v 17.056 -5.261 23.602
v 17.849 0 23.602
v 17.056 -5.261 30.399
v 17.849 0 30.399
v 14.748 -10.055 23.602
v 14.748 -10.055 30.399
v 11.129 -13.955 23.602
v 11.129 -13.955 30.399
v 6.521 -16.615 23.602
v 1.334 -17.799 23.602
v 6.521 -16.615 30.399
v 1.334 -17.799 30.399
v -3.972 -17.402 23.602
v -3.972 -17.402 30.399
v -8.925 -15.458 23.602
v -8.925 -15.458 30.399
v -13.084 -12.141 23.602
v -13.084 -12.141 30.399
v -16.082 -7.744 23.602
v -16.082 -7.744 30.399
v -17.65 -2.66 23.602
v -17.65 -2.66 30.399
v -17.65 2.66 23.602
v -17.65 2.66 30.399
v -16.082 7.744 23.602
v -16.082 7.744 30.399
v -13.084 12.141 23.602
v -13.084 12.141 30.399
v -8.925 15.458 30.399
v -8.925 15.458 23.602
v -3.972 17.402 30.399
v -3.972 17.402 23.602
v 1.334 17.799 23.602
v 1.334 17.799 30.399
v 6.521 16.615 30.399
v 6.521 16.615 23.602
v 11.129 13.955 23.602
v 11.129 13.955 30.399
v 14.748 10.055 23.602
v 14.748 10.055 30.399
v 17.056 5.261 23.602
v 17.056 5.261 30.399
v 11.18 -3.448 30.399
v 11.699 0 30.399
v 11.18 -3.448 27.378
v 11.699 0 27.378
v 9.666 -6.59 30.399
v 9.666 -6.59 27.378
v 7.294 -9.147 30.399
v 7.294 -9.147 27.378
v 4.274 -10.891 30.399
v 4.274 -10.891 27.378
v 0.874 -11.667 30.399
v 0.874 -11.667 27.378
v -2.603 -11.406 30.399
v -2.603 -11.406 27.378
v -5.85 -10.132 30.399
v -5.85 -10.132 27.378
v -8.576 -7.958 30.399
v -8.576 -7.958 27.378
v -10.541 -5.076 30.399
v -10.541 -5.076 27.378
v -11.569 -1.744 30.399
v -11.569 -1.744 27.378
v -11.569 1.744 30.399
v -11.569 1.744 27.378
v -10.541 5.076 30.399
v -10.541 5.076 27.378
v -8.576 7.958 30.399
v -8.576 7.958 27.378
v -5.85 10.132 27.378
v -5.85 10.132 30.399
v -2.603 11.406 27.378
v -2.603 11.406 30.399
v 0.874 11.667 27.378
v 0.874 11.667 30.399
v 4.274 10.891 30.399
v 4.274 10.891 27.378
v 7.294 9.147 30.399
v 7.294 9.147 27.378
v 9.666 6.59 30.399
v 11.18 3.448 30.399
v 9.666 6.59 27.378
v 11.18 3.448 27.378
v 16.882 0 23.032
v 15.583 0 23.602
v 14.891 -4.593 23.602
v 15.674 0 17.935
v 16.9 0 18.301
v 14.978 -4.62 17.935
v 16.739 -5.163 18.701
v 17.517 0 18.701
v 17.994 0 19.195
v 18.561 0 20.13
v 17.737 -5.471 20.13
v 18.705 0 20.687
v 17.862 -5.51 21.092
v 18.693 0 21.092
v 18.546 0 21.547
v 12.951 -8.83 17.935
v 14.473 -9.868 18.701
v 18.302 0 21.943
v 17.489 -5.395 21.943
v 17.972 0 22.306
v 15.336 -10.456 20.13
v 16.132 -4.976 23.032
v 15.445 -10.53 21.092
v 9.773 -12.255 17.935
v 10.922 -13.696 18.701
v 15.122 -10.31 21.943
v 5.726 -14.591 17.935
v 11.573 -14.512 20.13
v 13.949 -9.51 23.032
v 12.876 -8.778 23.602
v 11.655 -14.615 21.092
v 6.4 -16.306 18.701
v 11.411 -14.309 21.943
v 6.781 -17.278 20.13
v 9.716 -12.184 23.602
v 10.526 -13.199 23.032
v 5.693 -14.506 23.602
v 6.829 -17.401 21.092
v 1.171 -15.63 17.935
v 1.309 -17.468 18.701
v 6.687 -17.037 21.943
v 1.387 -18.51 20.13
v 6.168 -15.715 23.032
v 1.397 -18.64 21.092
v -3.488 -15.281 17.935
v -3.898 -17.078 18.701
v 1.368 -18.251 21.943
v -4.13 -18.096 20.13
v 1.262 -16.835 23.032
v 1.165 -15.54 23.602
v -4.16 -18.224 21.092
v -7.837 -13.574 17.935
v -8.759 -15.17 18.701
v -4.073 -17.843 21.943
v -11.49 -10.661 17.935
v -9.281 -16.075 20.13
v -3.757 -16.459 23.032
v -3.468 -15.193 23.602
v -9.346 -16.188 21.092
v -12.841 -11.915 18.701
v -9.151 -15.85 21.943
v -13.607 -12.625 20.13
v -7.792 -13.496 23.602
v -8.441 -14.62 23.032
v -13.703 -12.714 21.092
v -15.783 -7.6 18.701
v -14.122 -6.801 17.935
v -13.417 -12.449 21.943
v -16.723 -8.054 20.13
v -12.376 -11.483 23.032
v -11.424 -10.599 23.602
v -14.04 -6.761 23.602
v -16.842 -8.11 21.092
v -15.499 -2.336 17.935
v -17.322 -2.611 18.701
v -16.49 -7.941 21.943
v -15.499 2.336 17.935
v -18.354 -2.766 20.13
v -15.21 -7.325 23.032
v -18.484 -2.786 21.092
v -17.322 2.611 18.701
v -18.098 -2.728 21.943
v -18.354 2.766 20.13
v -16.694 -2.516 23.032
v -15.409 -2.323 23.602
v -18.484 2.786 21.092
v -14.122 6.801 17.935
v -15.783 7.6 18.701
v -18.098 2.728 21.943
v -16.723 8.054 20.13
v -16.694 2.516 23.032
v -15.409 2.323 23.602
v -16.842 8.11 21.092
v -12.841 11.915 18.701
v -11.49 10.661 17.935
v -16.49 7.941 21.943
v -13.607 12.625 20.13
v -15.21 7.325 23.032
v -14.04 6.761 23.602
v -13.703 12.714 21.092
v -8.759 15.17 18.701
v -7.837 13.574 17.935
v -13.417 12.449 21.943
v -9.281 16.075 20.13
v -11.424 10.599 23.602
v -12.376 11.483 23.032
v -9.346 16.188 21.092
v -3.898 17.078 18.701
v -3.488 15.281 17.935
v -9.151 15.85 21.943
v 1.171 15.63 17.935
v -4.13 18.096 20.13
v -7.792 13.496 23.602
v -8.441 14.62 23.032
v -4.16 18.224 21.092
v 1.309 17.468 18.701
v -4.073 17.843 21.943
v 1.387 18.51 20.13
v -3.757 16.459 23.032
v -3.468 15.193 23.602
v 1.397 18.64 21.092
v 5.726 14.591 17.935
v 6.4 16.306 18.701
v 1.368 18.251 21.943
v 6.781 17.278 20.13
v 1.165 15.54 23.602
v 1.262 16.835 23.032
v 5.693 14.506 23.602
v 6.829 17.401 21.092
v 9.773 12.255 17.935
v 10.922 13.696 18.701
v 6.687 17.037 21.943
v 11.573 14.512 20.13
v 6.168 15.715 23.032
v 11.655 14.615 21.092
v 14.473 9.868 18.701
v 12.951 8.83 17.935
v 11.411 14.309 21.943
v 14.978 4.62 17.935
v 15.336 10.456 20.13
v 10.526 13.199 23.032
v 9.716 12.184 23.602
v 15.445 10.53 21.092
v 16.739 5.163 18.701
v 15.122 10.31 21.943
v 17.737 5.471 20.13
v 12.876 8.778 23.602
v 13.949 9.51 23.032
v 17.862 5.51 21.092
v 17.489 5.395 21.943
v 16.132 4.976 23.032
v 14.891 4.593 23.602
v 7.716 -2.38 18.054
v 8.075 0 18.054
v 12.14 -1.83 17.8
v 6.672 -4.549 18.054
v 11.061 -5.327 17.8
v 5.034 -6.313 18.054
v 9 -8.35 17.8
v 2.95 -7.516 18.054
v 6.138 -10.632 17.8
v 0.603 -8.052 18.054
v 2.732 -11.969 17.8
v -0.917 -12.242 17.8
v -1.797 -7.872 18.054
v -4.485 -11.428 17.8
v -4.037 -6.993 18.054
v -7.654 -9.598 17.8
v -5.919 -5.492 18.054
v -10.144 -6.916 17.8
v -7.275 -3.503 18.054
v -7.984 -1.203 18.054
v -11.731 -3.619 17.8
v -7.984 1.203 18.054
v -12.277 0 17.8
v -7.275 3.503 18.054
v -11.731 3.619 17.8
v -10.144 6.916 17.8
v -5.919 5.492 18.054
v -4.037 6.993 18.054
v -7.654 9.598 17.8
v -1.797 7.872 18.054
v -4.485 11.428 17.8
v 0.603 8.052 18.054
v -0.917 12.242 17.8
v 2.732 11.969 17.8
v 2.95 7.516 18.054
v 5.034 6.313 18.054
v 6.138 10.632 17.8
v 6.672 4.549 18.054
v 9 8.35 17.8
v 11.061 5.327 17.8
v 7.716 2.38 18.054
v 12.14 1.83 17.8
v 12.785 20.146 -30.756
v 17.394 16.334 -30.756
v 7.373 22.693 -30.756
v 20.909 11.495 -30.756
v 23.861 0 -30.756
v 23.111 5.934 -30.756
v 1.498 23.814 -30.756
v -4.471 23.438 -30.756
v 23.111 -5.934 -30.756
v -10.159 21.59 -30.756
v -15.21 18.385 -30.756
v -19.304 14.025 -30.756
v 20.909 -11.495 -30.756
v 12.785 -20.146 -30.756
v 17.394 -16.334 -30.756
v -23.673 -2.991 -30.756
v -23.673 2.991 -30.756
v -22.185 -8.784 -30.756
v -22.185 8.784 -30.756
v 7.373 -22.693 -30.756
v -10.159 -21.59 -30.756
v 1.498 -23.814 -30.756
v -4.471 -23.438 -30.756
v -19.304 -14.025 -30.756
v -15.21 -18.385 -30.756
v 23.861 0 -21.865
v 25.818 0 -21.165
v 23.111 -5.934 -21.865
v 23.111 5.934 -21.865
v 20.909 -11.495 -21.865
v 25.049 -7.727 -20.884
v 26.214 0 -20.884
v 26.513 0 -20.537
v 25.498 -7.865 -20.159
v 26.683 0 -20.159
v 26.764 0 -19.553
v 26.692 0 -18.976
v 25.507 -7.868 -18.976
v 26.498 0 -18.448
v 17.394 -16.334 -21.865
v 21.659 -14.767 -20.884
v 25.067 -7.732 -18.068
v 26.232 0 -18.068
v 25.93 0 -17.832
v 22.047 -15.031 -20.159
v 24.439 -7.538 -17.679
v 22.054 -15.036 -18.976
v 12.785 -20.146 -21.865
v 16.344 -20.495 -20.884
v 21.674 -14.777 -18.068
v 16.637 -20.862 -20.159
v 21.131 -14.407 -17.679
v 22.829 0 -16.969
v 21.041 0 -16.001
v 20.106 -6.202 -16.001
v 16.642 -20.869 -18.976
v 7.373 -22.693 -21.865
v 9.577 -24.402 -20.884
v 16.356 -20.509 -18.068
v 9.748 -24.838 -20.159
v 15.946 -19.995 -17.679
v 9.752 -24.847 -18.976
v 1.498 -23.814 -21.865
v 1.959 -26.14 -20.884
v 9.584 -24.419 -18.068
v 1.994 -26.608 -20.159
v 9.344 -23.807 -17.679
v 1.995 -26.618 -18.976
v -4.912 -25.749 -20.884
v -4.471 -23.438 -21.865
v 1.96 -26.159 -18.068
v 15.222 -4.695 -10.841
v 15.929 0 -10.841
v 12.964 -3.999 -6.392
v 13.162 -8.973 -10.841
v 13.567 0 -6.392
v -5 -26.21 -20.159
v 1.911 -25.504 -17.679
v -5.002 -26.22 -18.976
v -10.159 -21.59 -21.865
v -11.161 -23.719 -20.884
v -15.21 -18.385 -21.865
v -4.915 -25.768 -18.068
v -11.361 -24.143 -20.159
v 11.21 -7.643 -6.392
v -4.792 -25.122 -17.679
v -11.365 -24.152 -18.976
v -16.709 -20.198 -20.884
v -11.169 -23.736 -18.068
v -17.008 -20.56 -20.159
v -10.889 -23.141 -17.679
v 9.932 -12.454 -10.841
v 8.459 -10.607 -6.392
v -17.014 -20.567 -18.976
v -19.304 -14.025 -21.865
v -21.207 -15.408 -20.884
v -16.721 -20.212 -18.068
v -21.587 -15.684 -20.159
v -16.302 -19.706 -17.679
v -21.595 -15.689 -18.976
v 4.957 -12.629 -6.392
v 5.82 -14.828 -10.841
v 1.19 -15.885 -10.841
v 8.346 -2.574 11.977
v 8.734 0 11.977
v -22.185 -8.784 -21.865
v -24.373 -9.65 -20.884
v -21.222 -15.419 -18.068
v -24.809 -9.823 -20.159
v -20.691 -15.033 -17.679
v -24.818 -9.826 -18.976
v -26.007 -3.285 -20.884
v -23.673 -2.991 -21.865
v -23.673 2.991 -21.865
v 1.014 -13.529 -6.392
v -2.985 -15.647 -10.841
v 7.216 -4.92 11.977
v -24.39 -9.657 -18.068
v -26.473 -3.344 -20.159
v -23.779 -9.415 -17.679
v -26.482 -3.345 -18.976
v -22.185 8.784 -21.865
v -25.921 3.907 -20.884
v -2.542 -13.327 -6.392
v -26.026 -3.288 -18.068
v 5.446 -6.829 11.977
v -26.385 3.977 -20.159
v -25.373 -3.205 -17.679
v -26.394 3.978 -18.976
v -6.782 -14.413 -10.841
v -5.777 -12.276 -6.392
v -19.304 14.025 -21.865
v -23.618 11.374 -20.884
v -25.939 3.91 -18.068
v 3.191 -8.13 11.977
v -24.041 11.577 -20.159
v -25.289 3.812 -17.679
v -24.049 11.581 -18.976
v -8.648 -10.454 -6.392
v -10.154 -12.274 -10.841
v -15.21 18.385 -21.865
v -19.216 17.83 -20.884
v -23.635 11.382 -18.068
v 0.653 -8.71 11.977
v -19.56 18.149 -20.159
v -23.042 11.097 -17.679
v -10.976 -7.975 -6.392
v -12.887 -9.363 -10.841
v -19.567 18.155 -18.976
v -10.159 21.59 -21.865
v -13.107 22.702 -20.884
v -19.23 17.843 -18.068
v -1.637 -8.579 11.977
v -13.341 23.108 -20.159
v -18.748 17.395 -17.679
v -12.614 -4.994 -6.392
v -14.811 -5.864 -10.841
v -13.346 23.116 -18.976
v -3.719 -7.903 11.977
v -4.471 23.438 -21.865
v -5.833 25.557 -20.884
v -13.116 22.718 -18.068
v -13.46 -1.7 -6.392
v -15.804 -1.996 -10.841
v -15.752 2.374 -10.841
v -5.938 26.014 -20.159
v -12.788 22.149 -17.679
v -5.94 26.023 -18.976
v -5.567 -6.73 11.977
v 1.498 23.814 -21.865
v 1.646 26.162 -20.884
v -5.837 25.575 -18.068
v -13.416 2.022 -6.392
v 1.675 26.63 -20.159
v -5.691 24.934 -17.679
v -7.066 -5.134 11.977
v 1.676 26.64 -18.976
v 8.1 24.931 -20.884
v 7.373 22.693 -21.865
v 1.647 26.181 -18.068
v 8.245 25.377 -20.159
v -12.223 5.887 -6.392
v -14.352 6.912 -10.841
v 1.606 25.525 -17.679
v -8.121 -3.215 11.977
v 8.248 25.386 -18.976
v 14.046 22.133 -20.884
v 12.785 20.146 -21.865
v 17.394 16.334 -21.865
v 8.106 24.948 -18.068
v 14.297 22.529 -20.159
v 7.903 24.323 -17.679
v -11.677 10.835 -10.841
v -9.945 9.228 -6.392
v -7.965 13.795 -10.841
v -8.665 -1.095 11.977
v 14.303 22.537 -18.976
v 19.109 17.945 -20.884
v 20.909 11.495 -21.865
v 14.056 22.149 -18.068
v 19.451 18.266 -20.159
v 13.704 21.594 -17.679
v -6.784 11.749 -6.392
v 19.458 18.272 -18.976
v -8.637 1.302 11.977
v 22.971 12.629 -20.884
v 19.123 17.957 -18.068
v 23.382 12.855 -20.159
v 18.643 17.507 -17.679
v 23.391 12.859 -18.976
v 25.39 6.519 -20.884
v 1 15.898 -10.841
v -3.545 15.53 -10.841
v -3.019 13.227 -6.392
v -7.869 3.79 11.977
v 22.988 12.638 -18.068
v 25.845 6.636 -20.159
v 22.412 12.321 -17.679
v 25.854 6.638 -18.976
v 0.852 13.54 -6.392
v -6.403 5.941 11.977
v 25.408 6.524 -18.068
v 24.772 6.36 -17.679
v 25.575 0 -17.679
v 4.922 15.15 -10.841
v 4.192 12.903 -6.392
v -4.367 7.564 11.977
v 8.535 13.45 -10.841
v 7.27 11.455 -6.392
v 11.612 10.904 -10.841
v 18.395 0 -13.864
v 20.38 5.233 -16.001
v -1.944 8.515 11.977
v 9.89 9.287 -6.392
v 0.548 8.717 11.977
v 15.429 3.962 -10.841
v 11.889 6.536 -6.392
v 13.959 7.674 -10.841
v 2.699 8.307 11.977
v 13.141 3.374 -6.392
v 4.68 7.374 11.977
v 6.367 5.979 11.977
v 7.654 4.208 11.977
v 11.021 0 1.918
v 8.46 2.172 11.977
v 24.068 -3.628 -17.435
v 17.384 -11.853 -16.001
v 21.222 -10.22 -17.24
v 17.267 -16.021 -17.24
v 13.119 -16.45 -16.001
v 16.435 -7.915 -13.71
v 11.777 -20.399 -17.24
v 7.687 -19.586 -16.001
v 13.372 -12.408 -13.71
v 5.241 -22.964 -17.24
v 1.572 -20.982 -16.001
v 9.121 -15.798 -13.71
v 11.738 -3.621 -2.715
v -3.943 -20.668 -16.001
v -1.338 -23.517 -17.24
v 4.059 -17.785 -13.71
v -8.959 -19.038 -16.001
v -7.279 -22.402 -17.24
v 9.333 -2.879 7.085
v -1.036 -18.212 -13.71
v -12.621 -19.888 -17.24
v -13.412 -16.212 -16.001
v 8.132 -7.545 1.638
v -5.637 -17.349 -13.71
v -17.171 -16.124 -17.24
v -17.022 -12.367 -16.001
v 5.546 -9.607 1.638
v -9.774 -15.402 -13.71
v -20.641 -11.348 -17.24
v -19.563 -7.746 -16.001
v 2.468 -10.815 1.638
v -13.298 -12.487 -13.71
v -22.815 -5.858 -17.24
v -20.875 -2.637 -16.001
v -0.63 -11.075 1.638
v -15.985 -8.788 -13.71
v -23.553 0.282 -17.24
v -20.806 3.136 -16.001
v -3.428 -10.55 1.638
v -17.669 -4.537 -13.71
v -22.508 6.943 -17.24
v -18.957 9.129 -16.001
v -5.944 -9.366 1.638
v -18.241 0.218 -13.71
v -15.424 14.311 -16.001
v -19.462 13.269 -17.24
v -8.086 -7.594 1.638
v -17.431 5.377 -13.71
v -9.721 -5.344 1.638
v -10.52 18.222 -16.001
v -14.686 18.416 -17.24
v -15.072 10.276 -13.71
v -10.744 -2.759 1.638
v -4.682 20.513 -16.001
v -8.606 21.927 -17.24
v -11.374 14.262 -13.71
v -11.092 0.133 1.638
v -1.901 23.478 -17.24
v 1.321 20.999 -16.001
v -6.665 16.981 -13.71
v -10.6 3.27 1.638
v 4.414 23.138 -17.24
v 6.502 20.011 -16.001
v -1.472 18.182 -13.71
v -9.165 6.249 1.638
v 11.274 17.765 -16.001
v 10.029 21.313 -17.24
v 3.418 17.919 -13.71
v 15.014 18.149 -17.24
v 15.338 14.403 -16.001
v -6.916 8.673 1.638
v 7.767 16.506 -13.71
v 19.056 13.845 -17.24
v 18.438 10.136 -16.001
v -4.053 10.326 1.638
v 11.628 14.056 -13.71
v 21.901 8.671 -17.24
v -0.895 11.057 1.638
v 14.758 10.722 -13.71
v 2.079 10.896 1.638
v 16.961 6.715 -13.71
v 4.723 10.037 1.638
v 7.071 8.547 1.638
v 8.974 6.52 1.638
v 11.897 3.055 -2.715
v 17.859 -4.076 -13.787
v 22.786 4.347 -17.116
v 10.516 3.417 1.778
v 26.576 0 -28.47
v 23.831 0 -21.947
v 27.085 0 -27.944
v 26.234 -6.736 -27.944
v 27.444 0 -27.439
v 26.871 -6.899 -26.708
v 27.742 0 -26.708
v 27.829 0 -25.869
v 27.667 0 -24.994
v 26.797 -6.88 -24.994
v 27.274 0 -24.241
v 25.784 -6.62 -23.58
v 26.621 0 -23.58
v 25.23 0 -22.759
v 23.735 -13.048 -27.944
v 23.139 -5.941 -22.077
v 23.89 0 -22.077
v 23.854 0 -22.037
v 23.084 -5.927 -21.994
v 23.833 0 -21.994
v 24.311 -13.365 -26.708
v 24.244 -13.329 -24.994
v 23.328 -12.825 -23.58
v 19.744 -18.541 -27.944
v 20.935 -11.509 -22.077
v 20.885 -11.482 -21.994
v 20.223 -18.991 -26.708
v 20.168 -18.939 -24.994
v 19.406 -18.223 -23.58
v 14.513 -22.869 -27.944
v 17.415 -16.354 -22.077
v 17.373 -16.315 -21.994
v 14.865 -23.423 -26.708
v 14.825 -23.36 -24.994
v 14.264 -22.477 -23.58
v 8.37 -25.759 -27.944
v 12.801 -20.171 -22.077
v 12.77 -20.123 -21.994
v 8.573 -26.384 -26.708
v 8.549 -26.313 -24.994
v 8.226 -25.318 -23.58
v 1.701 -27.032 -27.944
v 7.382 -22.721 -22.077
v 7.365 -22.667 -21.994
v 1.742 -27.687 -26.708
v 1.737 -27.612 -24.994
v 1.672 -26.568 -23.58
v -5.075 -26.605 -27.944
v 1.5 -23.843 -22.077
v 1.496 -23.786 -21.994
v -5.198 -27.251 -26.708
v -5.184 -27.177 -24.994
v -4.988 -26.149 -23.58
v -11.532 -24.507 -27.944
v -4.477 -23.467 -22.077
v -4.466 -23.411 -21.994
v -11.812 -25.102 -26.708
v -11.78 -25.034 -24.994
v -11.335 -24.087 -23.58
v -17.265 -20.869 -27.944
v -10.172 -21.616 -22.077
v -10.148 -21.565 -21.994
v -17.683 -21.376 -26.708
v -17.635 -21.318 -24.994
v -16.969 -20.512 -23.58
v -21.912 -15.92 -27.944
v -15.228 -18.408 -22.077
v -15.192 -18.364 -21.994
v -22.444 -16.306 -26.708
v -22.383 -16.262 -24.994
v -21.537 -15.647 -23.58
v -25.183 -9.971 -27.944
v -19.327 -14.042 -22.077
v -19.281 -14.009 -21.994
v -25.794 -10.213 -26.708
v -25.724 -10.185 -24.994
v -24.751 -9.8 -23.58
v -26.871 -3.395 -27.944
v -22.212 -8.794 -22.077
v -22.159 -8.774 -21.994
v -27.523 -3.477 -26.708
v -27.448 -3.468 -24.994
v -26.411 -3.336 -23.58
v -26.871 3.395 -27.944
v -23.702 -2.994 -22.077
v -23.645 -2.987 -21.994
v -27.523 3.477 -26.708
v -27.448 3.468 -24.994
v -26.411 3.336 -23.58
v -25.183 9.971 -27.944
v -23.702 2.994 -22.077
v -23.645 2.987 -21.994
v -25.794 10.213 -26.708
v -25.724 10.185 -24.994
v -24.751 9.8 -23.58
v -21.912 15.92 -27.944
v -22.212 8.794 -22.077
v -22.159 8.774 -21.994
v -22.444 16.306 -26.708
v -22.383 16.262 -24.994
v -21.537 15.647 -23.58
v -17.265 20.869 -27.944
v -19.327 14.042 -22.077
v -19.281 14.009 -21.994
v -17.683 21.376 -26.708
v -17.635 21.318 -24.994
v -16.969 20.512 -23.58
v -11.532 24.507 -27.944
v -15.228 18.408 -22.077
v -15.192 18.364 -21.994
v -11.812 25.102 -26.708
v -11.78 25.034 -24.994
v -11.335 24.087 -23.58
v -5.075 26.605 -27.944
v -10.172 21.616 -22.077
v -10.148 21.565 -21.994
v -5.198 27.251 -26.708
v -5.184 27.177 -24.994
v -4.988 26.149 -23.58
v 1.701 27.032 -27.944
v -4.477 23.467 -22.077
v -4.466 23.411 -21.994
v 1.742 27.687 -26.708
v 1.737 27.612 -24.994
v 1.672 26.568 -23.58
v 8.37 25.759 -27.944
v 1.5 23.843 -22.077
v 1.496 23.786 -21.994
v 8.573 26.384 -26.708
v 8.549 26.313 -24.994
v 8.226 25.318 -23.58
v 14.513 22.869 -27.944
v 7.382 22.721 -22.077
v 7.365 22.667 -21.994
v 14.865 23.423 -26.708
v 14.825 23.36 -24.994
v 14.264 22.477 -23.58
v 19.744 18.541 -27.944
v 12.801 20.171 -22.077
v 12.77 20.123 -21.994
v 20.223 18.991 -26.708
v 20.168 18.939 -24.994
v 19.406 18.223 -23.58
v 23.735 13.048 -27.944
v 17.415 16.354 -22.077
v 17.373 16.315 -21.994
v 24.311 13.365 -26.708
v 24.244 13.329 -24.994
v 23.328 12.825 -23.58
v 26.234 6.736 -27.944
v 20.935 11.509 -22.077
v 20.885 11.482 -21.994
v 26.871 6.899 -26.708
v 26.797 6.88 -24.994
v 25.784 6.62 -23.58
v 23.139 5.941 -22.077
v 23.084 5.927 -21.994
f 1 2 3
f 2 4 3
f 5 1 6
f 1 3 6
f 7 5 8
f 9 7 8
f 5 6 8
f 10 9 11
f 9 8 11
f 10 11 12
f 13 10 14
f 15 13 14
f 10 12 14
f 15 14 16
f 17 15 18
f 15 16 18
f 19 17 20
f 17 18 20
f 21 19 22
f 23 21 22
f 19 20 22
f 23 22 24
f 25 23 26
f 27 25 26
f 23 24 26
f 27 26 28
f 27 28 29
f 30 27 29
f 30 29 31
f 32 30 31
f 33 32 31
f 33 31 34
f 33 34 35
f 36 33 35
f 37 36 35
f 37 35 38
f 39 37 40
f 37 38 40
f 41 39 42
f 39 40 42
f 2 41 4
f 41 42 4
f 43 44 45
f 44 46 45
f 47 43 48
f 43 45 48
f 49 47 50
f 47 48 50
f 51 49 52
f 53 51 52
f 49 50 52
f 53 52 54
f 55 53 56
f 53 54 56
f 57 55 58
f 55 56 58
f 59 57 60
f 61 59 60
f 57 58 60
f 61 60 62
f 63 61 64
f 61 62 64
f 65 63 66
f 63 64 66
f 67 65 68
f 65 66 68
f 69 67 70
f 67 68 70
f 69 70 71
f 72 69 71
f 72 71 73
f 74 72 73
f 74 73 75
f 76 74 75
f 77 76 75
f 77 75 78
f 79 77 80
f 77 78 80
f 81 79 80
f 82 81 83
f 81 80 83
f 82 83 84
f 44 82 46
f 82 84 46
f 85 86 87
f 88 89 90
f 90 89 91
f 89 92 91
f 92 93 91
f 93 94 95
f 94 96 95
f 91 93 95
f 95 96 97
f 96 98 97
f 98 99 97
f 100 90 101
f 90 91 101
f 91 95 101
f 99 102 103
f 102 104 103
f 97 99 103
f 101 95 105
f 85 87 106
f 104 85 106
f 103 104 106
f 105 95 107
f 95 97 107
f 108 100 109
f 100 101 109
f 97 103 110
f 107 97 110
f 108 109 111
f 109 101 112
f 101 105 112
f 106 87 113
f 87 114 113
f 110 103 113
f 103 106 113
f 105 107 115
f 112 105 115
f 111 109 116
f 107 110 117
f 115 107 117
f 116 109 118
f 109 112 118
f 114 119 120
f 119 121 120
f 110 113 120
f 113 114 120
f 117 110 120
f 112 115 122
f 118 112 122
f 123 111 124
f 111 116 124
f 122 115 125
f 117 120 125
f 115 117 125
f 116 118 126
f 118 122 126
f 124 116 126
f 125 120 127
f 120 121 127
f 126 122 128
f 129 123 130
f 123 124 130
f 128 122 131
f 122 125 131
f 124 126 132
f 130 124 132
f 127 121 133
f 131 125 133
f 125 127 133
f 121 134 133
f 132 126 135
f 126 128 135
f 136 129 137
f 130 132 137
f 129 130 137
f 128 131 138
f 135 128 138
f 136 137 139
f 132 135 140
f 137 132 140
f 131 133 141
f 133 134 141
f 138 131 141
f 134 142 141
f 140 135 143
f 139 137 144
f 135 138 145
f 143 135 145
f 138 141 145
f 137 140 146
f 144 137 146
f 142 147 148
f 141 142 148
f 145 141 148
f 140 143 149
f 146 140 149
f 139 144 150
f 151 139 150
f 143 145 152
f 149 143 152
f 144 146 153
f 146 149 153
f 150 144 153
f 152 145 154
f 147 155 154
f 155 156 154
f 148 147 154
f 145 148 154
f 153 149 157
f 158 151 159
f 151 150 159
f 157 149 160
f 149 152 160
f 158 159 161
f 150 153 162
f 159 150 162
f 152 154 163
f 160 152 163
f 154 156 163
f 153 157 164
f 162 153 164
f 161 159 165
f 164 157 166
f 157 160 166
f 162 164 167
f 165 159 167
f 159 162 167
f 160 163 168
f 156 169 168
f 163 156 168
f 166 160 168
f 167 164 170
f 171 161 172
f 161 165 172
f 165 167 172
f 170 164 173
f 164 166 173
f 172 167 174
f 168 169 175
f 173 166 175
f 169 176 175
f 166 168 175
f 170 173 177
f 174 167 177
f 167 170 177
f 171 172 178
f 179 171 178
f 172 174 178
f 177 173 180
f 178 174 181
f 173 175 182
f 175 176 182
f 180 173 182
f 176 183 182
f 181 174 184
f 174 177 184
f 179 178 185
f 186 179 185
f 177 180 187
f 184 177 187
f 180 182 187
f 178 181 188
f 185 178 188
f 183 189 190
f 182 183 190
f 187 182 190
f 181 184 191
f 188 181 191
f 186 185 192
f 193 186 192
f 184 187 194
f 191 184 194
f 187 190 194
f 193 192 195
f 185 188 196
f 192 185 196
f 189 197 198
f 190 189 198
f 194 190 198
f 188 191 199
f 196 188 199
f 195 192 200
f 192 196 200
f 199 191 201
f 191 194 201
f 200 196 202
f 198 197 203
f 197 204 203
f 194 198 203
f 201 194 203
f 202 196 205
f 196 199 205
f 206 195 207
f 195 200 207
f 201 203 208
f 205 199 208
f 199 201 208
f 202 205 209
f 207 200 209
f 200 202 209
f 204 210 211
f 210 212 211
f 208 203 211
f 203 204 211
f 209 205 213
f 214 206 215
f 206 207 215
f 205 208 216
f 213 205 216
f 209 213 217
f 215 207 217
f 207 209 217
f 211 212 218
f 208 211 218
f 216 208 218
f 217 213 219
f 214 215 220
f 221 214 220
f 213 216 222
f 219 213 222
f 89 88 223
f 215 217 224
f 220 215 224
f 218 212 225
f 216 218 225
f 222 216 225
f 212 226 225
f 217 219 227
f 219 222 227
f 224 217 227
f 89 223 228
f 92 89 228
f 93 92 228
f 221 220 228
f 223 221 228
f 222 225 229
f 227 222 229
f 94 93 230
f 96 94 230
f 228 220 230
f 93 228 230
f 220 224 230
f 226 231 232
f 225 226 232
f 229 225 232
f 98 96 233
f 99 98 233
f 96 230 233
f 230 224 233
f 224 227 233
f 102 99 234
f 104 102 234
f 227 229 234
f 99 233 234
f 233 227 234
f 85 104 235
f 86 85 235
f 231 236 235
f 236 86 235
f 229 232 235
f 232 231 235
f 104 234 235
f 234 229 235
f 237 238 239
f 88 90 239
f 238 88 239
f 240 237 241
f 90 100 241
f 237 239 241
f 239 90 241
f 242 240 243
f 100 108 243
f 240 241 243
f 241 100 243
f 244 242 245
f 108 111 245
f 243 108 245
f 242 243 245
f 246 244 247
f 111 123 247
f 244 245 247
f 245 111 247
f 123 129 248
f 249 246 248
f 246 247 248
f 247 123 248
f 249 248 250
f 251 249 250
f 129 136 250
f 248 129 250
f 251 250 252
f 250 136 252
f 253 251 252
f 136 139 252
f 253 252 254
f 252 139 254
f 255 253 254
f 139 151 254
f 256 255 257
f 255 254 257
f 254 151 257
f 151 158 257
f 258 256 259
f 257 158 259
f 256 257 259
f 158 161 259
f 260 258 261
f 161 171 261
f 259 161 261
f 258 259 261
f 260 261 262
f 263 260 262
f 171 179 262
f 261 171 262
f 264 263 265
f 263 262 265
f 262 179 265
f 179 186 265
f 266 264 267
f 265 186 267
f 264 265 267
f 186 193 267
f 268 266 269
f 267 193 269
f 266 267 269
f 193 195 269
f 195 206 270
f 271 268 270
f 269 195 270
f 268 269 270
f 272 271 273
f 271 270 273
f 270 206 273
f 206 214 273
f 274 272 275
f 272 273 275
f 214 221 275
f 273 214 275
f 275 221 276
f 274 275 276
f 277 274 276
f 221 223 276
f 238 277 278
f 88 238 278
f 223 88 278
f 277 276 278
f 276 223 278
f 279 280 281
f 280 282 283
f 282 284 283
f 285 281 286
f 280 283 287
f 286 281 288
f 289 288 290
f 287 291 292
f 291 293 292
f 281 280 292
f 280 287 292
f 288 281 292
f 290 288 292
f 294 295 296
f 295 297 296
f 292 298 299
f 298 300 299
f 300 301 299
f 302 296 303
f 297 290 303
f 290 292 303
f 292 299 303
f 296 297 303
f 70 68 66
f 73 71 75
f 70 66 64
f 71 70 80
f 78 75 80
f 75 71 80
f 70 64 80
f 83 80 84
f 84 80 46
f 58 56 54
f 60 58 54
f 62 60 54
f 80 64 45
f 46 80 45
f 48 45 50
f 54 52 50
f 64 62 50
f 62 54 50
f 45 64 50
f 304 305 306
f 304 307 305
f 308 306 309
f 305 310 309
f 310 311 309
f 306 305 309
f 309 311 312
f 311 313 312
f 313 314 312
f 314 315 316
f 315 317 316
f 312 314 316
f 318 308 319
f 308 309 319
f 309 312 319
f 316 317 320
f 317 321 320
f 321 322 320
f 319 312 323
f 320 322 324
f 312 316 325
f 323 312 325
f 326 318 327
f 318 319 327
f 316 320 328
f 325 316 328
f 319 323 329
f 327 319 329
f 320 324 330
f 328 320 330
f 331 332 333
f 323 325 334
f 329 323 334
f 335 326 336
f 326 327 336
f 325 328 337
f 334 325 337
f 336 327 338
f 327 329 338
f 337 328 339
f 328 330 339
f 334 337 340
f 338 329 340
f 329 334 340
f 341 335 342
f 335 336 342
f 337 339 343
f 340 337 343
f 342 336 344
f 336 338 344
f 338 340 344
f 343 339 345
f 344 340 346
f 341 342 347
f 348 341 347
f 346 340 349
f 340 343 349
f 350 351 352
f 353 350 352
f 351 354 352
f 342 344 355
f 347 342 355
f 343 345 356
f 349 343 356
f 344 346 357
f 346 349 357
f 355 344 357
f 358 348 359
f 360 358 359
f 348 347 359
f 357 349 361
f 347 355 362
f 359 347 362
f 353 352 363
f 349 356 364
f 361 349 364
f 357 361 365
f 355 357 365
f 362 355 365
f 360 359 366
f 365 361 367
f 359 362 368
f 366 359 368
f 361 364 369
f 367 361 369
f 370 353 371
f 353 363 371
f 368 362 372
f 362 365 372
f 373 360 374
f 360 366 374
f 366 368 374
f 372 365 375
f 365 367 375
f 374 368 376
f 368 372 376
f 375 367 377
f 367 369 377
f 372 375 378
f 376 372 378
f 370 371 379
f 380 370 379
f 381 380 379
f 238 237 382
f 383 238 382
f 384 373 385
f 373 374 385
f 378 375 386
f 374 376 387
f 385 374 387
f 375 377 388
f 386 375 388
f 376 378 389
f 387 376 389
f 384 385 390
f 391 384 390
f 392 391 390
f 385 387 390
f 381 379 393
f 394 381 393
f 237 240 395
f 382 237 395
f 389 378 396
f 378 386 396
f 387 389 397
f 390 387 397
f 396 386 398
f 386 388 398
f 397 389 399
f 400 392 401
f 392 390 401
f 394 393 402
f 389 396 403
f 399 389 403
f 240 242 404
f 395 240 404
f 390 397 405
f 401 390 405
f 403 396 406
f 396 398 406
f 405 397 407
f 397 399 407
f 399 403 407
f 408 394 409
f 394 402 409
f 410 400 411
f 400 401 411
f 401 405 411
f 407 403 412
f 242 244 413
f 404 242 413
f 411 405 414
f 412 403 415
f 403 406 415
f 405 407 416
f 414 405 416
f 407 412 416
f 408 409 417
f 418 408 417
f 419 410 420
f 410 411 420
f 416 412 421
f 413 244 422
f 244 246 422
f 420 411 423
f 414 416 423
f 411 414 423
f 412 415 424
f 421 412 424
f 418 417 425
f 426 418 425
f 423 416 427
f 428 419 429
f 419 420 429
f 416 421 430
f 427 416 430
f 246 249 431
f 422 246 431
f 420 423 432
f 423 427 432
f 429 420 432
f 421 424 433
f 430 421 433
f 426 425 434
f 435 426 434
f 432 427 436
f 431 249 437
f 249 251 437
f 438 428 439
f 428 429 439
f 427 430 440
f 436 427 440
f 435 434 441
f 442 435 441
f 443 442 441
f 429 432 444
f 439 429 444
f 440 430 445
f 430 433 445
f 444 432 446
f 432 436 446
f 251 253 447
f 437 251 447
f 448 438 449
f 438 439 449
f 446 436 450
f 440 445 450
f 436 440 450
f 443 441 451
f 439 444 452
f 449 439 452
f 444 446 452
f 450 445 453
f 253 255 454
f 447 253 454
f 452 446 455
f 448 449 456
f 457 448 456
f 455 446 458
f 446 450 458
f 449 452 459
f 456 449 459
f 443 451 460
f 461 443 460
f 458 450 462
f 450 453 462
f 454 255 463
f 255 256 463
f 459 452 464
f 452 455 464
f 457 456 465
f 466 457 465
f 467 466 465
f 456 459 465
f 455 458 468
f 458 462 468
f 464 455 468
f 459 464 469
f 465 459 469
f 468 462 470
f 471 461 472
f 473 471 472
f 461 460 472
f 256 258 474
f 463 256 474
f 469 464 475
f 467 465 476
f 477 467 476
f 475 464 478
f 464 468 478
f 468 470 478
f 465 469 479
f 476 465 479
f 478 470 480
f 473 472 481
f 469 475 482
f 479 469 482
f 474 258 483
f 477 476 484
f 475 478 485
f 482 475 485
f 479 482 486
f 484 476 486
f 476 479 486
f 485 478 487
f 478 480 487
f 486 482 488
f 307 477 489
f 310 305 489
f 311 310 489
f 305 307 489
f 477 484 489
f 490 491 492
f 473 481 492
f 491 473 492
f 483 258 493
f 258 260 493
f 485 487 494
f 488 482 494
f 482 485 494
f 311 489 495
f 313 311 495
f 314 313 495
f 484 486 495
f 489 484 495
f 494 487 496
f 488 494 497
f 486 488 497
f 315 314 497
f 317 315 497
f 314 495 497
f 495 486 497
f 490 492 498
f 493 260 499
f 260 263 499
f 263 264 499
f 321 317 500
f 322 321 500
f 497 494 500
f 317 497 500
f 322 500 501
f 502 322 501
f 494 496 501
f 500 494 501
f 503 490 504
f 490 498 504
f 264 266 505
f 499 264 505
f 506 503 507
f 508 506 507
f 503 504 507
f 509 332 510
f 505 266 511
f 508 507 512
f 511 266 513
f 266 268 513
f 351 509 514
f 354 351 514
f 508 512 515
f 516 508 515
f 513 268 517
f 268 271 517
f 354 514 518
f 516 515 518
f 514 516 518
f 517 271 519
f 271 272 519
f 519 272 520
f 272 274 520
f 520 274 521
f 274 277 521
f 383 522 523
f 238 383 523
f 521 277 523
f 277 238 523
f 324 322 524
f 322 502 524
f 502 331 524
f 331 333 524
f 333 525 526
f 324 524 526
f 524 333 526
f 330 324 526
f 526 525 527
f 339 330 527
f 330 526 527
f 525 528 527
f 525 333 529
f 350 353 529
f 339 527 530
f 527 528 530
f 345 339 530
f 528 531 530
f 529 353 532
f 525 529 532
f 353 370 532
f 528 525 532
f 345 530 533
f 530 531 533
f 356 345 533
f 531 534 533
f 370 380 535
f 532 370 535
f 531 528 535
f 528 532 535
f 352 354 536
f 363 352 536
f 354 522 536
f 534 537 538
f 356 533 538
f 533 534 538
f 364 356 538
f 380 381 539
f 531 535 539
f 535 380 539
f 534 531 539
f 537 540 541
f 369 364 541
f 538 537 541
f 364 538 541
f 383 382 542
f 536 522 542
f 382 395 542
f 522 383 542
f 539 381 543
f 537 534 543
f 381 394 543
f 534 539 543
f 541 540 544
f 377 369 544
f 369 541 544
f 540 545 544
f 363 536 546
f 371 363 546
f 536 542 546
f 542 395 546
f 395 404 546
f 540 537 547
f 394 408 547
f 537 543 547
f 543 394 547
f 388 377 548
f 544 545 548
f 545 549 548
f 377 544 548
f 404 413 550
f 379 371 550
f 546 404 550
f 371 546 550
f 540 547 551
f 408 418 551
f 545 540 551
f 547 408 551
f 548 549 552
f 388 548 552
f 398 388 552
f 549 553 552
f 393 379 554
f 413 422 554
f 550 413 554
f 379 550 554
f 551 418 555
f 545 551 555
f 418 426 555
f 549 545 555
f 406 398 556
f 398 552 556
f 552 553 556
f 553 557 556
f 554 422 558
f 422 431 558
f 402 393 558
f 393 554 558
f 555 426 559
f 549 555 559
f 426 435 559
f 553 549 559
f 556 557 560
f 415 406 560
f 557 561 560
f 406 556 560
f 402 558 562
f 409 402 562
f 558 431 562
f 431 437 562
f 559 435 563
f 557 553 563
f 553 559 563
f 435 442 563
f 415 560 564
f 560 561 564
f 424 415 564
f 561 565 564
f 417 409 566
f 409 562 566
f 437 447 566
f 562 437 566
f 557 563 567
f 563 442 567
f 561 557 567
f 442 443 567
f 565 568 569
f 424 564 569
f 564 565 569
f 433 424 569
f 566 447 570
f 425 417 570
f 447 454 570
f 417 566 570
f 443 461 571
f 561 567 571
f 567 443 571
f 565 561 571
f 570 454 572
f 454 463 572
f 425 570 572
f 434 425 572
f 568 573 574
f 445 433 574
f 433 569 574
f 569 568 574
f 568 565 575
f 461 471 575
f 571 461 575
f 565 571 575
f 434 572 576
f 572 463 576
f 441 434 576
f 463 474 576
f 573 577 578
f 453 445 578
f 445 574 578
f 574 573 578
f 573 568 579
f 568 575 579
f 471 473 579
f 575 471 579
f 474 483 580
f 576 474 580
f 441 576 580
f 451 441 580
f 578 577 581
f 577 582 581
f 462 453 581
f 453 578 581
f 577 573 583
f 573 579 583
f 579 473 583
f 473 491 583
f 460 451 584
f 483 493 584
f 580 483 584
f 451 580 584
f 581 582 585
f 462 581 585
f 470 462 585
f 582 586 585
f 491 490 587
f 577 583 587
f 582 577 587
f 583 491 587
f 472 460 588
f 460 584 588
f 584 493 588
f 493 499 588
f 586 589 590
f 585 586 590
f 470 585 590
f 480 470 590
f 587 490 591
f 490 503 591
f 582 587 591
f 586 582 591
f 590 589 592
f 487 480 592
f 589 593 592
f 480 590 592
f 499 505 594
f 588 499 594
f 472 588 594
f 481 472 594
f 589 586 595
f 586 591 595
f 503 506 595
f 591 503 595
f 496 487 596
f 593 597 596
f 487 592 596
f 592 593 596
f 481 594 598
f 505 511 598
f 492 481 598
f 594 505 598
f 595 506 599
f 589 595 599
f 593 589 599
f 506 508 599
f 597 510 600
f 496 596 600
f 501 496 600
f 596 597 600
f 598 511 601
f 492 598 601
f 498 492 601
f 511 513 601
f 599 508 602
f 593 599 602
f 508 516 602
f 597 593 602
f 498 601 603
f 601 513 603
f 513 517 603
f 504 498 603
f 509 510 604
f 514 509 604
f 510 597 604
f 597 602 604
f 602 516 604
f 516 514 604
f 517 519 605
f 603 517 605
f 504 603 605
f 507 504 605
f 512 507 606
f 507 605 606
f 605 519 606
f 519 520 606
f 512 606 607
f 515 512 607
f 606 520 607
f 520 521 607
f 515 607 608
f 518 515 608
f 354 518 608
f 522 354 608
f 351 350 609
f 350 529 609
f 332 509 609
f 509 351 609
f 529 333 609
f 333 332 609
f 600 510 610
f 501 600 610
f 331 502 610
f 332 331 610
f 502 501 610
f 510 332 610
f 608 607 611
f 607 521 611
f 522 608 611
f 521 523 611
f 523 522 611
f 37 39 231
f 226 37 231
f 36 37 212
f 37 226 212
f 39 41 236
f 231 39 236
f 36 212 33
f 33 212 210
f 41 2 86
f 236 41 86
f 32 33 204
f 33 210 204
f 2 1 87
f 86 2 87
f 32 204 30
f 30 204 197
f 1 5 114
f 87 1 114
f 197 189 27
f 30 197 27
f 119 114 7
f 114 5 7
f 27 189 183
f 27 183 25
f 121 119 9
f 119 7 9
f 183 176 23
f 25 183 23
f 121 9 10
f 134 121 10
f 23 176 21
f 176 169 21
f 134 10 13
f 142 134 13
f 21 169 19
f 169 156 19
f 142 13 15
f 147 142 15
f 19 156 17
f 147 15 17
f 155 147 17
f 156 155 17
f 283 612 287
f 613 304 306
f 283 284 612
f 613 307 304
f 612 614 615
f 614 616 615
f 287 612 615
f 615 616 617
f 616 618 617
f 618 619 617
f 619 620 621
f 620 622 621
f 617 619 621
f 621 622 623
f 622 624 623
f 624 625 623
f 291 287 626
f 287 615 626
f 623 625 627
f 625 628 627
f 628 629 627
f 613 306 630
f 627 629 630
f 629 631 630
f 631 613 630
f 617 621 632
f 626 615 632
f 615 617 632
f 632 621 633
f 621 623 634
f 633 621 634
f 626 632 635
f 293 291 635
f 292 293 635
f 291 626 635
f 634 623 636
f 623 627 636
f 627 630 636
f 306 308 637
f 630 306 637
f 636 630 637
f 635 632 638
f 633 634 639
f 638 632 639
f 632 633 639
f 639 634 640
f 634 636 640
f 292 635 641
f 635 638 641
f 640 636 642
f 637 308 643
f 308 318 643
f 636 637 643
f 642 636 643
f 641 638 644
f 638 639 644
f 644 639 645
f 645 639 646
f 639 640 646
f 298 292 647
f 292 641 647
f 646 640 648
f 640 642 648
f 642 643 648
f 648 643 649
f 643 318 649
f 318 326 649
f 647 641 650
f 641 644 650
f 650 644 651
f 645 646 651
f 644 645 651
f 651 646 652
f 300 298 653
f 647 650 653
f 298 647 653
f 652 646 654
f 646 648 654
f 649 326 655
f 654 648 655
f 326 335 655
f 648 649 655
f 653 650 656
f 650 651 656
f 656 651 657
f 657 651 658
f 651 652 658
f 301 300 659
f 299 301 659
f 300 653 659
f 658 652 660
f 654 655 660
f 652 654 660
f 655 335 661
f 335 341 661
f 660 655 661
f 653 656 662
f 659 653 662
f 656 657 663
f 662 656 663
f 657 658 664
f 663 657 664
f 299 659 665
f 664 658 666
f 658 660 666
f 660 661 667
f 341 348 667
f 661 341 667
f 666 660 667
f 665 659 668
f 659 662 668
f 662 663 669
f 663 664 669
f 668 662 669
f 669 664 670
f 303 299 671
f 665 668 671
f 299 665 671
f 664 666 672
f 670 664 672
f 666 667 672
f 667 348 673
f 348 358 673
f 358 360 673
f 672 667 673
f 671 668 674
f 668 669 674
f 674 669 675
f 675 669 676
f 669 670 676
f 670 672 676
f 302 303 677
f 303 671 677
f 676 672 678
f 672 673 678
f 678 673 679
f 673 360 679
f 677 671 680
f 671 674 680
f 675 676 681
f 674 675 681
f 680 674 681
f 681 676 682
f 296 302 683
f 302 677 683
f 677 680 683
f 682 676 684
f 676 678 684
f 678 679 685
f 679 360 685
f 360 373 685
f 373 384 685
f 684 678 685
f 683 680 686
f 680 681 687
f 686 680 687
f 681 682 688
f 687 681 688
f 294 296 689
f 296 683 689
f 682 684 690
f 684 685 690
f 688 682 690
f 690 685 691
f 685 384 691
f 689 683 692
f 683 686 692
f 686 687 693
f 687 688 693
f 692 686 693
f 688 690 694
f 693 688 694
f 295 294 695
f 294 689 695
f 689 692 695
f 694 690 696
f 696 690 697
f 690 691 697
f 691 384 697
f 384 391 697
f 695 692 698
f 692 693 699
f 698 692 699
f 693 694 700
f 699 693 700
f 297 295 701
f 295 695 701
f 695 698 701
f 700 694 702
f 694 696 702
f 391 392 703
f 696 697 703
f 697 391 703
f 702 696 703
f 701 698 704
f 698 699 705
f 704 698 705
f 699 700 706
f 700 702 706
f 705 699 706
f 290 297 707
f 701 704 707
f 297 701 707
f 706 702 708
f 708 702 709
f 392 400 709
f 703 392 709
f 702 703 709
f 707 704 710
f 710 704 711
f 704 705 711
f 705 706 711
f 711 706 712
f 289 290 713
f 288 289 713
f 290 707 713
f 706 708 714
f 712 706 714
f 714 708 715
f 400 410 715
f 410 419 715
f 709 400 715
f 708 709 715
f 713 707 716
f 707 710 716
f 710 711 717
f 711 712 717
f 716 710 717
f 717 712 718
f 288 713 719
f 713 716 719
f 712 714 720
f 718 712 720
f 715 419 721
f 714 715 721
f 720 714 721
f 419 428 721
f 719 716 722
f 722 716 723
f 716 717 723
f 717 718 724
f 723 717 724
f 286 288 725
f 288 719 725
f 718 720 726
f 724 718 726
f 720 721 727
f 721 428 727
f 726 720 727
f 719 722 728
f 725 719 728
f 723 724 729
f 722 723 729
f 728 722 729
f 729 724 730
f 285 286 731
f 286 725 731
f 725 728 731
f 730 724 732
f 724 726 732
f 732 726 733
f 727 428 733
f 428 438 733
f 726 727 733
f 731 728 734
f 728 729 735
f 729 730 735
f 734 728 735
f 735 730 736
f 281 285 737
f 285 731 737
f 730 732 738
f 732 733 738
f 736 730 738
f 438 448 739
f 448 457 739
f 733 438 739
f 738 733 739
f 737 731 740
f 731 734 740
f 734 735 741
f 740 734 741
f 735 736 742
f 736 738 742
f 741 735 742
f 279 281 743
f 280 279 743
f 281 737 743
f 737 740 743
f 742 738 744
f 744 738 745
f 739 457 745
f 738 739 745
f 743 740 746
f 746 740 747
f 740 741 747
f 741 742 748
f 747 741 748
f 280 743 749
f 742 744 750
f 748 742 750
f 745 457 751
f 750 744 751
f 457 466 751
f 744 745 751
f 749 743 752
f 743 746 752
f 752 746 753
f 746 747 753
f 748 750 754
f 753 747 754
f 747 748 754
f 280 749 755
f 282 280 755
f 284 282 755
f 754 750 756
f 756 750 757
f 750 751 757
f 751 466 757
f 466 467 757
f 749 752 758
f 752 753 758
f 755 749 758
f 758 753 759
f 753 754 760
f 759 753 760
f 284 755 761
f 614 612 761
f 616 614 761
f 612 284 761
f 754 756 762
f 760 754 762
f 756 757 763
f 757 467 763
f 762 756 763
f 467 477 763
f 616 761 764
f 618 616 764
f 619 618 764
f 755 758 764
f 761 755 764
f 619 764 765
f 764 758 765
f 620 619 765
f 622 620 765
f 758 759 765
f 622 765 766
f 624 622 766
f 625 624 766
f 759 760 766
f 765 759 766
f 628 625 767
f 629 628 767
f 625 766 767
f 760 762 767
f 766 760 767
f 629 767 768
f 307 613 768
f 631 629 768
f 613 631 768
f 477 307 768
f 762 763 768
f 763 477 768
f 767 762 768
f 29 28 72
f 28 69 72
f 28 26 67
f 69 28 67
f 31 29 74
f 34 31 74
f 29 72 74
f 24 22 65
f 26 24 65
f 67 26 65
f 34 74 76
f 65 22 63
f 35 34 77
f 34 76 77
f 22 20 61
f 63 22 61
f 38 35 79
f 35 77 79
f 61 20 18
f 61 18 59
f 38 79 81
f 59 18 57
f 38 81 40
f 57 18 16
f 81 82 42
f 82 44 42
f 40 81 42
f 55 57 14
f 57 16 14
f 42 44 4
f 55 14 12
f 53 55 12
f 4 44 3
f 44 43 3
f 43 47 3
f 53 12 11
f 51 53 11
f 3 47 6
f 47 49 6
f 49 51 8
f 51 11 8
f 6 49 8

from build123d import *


with BuildPart() as f1:
    # F0 (on Front) → F1 (revolve)
    with BuildSketch(Plane.XZ):
        with BuildLine():
            Line((11.6993812844, 27.378199622), (0, 27.378199622))
            Line((0, 27.378199622), (0, -30.7560488582))
            Line((0, -30.7560488582), (23.8608885556, -30.7560488582))
            add(Edge.make_bspline(
                [(23.8608885556, -30.7560488582), (24.5933260941, -30.1514504341), (26.0244152867, -28.9701425065), (28.1129288139, -27.1453076724), (27.724819491, -23.4267474423), (23.6843399938, -22.2275266084), (23.8334786345, -21.9212153789), (23.8608885556, -21.8649189919)],
                knots=[0, 0, 0, 0, 0.2278976163, 0.4452827695, 0.6862551255, 0.9423373969, 1, 1, 1, 1], degree=3))
            add(Edge.make_bspline(
                [(23.8608885556, -21.8649189919), (25.0156210056, -21.5491542532), (27.1860600174, -20.9556417842), (26.5182559869, -17.4500804997), (23.5397902626, -17.7021570545), (18.0565972261, -14.2878060097), (13.8014158542, -7.7703084137), (11.4684846903, -0.3087738395), (8.1921464828, 13.5035493763), (8.1055923638, 16.8545016516), (8.0745983869, 18.0544368923)],
                knots=[0, 0, 0, 0, 0.093242417, 0.1752587618, 0.2586618288, 0.3907824261, 0.536672613, 0.6900750113, 0.8890196322, 1, 1, 1, 1], degree=3))
            add(Edge.make_bspline(
                [(8.0745983869, 18.0544368923), (11.2817604302, 17.8184456192), (16.1581594981, 17.4596275711), (18.099860581, 19.1260604946), (19.0331946236, 20.9237611344), (17.9311149535, 22.6447217964), (16.4145861338, 23.2630987521), (15.5834862962, 23.6019864678)],
                knots=[0, 0, 0, 0, 0.3328239979, 0.5060494641, 0.6599088276, 0.8136206088, 1, 1, 1, 1], degree=3))
            Line((15.5834862962, 23.6019864678), (17.8492125124, 23.6019864678))
            Line((17.8492125124, 23.6019864678), (17.8492125124, 30.3991679102))
            Line((17.8492125124, 30.3991679102), (11.6993812844, 30.3991679102))
            Line((11.6993812844, 30.3991679102), (11.6993812844, 27.378199622))
        make_face()
    revolve(axis=Axis((0, 0, 4.4455658644), (0, 0, -1)))


solid = f1.part
